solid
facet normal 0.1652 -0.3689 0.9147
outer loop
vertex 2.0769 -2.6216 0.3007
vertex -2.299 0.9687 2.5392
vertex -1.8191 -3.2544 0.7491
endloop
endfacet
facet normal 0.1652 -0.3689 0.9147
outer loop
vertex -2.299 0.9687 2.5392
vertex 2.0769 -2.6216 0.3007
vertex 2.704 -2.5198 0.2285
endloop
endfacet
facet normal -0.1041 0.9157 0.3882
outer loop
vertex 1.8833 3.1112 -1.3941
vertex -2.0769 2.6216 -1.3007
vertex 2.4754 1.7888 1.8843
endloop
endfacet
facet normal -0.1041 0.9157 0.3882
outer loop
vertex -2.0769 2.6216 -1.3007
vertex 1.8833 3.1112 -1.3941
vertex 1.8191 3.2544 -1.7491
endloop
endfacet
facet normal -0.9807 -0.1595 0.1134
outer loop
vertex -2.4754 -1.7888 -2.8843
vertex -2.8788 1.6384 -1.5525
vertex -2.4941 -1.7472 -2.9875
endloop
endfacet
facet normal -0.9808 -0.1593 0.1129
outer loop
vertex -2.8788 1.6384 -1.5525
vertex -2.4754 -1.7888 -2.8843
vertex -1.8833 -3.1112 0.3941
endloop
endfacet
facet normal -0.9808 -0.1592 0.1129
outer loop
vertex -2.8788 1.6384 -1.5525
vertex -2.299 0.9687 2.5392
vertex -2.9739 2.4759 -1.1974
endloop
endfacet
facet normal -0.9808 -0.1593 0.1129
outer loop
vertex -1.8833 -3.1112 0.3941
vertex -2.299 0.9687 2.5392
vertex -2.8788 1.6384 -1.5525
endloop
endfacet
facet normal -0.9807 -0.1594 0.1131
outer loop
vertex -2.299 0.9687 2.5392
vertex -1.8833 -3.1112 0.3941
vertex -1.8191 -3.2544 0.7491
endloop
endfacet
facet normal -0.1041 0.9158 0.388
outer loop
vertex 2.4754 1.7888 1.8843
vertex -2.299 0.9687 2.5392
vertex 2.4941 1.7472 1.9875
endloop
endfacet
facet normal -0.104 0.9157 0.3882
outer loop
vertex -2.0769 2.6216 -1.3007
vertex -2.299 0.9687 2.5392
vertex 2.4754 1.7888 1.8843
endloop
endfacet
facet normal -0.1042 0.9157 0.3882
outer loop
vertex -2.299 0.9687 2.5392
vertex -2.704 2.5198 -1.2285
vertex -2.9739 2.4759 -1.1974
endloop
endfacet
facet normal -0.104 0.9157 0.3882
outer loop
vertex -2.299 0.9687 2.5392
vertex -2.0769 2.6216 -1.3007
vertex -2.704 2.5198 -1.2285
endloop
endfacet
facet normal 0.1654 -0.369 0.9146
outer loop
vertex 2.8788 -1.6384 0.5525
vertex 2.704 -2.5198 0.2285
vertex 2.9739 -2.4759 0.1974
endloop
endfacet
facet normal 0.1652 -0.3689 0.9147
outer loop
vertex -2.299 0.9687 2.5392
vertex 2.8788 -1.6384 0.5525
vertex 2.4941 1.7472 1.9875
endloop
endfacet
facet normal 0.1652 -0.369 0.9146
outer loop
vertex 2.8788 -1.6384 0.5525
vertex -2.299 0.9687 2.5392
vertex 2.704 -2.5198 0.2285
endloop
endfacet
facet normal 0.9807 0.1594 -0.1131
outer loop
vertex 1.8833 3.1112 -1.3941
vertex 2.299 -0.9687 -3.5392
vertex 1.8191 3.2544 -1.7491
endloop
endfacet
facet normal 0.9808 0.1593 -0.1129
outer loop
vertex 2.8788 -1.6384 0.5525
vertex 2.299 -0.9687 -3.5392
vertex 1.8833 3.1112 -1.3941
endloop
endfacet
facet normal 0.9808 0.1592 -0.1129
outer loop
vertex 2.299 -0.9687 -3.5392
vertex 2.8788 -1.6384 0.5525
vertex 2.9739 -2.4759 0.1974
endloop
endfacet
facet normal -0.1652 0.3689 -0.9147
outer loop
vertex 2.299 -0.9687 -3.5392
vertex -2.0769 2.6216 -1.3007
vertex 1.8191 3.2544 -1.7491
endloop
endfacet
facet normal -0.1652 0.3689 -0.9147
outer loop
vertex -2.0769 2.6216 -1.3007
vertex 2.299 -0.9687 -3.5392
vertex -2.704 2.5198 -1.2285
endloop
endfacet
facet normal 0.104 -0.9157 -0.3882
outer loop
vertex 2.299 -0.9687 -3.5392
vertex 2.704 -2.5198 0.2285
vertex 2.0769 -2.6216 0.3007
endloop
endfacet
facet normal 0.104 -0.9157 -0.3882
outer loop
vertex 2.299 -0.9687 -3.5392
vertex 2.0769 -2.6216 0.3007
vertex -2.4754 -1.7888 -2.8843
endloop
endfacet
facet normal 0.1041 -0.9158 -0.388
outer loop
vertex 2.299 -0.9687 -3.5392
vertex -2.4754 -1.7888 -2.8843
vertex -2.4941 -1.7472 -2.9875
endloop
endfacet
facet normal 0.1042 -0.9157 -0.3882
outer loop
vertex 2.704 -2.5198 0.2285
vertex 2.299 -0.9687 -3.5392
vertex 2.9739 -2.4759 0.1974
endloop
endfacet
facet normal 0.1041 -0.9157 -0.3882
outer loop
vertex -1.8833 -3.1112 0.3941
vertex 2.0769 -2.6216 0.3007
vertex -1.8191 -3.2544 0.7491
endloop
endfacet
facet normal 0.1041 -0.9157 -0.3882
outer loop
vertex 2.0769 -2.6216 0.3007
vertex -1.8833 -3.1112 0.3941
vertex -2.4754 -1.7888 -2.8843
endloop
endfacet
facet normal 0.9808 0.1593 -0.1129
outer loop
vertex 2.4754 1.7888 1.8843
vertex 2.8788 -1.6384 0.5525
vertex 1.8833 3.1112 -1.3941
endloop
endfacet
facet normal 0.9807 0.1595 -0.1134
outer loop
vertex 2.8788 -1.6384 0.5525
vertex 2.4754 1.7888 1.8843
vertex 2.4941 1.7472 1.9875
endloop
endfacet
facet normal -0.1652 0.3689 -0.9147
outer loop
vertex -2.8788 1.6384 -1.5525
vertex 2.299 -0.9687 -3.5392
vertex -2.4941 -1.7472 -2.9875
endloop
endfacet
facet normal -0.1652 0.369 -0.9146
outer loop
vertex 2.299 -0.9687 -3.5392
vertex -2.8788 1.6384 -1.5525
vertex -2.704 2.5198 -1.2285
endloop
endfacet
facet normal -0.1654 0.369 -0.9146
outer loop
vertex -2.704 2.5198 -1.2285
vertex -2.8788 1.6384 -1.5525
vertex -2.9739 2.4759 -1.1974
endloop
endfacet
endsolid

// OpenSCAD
sliceh=1;
kr=rands(0,36,3);
slice3d()
rotate(kr)cube(5,true);


module slice3d(n=0){
    %children();
    if (n>0)
    {
           intersection(){
            
            
           translate([0,0,-sliceh])
               hull()slice3d(n-1) children();
           slice3d(n-1)  children();
            }
        }
    else
        intersection(){
            
            
           translate([0,0,-sliceh])hull() children();
            children();
            }
    
    }
